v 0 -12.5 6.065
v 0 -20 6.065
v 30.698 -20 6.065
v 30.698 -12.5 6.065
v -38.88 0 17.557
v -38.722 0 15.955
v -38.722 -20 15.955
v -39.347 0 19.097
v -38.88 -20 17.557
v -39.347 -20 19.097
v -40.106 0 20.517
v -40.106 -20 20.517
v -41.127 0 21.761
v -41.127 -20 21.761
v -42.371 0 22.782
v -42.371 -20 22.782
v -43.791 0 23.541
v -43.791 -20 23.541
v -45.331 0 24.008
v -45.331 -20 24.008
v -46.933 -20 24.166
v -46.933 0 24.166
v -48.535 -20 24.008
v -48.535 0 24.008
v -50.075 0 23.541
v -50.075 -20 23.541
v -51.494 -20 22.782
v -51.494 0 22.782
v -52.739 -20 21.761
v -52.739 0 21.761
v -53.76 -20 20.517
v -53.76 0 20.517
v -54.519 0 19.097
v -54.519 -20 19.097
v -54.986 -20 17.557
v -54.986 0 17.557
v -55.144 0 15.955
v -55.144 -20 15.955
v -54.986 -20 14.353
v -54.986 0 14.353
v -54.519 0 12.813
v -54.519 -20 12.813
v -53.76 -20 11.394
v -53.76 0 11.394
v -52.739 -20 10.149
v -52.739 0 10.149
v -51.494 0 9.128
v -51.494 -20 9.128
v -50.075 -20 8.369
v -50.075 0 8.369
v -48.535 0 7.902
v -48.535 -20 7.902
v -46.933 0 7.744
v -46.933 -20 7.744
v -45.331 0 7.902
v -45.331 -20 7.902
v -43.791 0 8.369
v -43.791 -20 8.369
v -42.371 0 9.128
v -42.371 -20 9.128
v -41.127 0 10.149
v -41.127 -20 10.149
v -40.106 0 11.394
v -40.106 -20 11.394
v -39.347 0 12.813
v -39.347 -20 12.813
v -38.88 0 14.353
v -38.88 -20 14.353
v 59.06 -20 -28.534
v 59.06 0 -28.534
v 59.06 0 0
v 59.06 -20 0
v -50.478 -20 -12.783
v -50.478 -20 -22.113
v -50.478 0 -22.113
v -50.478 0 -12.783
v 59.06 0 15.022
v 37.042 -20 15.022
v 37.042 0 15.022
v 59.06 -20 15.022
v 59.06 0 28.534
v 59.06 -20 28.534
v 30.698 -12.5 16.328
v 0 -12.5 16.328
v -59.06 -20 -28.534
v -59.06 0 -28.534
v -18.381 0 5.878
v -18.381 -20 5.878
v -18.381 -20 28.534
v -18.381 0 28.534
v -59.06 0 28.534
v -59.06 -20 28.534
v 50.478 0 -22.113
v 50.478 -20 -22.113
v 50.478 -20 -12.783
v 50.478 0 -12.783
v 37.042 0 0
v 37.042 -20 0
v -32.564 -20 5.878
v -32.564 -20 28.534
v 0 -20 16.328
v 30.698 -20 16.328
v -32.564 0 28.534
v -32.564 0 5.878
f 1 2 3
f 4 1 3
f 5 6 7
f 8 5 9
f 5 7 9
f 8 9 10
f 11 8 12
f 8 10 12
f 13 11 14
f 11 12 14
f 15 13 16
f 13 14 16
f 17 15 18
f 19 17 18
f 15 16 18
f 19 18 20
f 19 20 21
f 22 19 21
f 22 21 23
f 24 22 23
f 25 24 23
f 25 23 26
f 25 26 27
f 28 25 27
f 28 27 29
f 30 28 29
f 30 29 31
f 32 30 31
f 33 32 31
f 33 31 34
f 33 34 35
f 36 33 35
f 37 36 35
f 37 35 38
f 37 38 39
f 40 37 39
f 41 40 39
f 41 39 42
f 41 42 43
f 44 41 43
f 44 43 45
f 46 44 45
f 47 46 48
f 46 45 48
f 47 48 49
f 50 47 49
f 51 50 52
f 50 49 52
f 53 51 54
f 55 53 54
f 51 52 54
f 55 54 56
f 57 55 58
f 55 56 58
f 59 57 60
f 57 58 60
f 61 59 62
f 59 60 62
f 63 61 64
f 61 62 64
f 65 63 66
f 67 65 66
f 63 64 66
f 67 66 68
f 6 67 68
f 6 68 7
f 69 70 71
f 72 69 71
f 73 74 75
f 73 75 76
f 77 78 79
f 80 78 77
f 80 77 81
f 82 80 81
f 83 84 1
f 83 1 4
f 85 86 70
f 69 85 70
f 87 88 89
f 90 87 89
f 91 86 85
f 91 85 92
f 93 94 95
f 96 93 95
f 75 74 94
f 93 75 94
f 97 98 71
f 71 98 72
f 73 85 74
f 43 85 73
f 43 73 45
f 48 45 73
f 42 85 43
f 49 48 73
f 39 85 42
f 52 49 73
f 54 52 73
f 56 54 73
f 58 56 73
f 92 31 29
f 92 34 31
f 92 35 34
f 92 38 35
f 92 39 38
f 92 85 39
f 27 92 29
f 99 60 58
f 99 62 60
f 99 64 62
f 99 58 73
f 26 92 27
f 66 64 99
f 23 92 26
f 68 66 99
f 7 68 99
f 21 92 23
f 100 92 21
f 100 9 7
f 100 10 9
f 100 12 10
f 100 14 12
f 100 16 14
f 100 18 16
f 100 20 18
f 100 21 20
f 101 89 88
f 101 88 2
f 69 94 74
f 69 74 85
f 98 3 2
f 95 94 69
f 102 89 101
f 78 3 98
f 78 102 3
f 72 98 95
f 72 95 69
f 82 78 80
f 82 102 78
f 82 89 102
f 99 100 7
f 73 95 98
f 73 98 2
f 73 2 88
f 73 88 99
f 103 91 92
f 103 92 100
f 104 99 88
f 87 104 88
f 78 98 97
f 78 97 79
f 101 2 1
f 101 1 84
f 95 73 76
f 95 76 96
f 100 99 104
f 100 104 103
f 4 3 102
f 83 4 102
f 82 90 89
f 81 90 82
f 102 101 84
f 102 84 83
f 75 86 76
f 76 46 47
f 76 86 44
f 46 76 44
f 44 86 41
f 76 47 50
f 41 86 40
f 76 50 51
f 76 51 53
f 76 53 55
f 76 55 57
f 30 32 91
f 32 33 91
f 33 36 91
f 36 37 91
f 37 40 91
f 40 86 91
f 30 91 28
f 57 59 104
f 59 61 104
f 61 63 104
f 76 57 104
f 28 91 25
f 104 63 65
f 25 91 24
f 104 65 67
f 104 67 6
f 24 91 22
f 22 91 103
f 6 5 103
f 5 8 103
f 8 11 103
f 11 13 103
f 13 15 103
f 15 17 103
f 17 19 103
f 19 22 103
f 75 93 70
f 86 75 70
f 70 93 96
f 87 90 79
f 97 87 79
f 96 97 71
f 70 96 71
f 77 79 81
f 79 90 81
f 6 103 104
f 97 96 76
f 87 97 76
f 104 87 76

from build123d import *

# Parameters (mm, degrees)
F0_W      = 118.1190237403
F0_H      = 57.0687428117
F1_DEPTH  = 20
F2_R      = 8.2109048963
F3_DEPTH  = 20.001
F4_W      = 14.182465151
F4_H      = 22.6561129093
F5_DEPTH  = 20.001
F6_W      = 30.6975711137
F6_H      = 10.263627395
F7_DEPTH  = 7.5
F8_W      = 22.0171548426
F8_H      = 15.0222154334
F9_DEPTH  = 20.001
F10_W     = 100.9567603469
F10_H     = 9.3305669725
F11_DEPTH = 20.001


with BuildPart() as f1:
    # F0 (on Front) → F1 (new body)
    with BuildSketch(Plane.XZ):
        Rectangle(F0_W, F0_H)
    extrude(amount=F1_DEPTH)

    # F2 (on face) → F3 (cut, through all)
    with BuildSketch(Plane.XZ.offset(20)):
        with Locations((-46.9327643514, 15.955273062)):
            Circle(F2_R)
    extrude(amount=-F3_DEPTH, mode=Mode.SUBTRACT)

    # F4 (on face) → F5 (cut, through all)
    with BuildSketch(Plane.XZ.offset(20)):
        with Locations((-25.4724537954, 17.2063149512)):
            Rectangle(F4_W, F4_H)
    extrude(amount=-F5_DEPTH, mode=Mode.SUBTRACT)

    # F6 (on face) → F7 (cut)
    with BuildSketch(Plane.XZ.offset(20)):
        with Locations((15.3487855569, 11.196683161)):
            Rectangle(F6_W, F6_H)
    extrude(amount=-F7_DEPTH, mode=Mode.SUBTRACT)

    # F8 (on face) → F9 (cut, through all)
    with BuildSketch(Plane.XZ.offset(20)):
        with Locations((48.0509344488, 7.5111077167)):
            Rectangle(F8_W, F8_H)
    extrude(amount=-F9_DEPTH, mode=Mode.SUBTRACT)

    # F10 (on face) → F11 (cut, through all)
    with BuildSketch(Plane.XZ.offset(20)):
        with Locations((0, -17.4481645226)):
            Rectangle(F10_W, F10_H)
    extrude(amount=-F11_DEPTH, mode=Mode.SUBTRACT)


solid = f1.part
